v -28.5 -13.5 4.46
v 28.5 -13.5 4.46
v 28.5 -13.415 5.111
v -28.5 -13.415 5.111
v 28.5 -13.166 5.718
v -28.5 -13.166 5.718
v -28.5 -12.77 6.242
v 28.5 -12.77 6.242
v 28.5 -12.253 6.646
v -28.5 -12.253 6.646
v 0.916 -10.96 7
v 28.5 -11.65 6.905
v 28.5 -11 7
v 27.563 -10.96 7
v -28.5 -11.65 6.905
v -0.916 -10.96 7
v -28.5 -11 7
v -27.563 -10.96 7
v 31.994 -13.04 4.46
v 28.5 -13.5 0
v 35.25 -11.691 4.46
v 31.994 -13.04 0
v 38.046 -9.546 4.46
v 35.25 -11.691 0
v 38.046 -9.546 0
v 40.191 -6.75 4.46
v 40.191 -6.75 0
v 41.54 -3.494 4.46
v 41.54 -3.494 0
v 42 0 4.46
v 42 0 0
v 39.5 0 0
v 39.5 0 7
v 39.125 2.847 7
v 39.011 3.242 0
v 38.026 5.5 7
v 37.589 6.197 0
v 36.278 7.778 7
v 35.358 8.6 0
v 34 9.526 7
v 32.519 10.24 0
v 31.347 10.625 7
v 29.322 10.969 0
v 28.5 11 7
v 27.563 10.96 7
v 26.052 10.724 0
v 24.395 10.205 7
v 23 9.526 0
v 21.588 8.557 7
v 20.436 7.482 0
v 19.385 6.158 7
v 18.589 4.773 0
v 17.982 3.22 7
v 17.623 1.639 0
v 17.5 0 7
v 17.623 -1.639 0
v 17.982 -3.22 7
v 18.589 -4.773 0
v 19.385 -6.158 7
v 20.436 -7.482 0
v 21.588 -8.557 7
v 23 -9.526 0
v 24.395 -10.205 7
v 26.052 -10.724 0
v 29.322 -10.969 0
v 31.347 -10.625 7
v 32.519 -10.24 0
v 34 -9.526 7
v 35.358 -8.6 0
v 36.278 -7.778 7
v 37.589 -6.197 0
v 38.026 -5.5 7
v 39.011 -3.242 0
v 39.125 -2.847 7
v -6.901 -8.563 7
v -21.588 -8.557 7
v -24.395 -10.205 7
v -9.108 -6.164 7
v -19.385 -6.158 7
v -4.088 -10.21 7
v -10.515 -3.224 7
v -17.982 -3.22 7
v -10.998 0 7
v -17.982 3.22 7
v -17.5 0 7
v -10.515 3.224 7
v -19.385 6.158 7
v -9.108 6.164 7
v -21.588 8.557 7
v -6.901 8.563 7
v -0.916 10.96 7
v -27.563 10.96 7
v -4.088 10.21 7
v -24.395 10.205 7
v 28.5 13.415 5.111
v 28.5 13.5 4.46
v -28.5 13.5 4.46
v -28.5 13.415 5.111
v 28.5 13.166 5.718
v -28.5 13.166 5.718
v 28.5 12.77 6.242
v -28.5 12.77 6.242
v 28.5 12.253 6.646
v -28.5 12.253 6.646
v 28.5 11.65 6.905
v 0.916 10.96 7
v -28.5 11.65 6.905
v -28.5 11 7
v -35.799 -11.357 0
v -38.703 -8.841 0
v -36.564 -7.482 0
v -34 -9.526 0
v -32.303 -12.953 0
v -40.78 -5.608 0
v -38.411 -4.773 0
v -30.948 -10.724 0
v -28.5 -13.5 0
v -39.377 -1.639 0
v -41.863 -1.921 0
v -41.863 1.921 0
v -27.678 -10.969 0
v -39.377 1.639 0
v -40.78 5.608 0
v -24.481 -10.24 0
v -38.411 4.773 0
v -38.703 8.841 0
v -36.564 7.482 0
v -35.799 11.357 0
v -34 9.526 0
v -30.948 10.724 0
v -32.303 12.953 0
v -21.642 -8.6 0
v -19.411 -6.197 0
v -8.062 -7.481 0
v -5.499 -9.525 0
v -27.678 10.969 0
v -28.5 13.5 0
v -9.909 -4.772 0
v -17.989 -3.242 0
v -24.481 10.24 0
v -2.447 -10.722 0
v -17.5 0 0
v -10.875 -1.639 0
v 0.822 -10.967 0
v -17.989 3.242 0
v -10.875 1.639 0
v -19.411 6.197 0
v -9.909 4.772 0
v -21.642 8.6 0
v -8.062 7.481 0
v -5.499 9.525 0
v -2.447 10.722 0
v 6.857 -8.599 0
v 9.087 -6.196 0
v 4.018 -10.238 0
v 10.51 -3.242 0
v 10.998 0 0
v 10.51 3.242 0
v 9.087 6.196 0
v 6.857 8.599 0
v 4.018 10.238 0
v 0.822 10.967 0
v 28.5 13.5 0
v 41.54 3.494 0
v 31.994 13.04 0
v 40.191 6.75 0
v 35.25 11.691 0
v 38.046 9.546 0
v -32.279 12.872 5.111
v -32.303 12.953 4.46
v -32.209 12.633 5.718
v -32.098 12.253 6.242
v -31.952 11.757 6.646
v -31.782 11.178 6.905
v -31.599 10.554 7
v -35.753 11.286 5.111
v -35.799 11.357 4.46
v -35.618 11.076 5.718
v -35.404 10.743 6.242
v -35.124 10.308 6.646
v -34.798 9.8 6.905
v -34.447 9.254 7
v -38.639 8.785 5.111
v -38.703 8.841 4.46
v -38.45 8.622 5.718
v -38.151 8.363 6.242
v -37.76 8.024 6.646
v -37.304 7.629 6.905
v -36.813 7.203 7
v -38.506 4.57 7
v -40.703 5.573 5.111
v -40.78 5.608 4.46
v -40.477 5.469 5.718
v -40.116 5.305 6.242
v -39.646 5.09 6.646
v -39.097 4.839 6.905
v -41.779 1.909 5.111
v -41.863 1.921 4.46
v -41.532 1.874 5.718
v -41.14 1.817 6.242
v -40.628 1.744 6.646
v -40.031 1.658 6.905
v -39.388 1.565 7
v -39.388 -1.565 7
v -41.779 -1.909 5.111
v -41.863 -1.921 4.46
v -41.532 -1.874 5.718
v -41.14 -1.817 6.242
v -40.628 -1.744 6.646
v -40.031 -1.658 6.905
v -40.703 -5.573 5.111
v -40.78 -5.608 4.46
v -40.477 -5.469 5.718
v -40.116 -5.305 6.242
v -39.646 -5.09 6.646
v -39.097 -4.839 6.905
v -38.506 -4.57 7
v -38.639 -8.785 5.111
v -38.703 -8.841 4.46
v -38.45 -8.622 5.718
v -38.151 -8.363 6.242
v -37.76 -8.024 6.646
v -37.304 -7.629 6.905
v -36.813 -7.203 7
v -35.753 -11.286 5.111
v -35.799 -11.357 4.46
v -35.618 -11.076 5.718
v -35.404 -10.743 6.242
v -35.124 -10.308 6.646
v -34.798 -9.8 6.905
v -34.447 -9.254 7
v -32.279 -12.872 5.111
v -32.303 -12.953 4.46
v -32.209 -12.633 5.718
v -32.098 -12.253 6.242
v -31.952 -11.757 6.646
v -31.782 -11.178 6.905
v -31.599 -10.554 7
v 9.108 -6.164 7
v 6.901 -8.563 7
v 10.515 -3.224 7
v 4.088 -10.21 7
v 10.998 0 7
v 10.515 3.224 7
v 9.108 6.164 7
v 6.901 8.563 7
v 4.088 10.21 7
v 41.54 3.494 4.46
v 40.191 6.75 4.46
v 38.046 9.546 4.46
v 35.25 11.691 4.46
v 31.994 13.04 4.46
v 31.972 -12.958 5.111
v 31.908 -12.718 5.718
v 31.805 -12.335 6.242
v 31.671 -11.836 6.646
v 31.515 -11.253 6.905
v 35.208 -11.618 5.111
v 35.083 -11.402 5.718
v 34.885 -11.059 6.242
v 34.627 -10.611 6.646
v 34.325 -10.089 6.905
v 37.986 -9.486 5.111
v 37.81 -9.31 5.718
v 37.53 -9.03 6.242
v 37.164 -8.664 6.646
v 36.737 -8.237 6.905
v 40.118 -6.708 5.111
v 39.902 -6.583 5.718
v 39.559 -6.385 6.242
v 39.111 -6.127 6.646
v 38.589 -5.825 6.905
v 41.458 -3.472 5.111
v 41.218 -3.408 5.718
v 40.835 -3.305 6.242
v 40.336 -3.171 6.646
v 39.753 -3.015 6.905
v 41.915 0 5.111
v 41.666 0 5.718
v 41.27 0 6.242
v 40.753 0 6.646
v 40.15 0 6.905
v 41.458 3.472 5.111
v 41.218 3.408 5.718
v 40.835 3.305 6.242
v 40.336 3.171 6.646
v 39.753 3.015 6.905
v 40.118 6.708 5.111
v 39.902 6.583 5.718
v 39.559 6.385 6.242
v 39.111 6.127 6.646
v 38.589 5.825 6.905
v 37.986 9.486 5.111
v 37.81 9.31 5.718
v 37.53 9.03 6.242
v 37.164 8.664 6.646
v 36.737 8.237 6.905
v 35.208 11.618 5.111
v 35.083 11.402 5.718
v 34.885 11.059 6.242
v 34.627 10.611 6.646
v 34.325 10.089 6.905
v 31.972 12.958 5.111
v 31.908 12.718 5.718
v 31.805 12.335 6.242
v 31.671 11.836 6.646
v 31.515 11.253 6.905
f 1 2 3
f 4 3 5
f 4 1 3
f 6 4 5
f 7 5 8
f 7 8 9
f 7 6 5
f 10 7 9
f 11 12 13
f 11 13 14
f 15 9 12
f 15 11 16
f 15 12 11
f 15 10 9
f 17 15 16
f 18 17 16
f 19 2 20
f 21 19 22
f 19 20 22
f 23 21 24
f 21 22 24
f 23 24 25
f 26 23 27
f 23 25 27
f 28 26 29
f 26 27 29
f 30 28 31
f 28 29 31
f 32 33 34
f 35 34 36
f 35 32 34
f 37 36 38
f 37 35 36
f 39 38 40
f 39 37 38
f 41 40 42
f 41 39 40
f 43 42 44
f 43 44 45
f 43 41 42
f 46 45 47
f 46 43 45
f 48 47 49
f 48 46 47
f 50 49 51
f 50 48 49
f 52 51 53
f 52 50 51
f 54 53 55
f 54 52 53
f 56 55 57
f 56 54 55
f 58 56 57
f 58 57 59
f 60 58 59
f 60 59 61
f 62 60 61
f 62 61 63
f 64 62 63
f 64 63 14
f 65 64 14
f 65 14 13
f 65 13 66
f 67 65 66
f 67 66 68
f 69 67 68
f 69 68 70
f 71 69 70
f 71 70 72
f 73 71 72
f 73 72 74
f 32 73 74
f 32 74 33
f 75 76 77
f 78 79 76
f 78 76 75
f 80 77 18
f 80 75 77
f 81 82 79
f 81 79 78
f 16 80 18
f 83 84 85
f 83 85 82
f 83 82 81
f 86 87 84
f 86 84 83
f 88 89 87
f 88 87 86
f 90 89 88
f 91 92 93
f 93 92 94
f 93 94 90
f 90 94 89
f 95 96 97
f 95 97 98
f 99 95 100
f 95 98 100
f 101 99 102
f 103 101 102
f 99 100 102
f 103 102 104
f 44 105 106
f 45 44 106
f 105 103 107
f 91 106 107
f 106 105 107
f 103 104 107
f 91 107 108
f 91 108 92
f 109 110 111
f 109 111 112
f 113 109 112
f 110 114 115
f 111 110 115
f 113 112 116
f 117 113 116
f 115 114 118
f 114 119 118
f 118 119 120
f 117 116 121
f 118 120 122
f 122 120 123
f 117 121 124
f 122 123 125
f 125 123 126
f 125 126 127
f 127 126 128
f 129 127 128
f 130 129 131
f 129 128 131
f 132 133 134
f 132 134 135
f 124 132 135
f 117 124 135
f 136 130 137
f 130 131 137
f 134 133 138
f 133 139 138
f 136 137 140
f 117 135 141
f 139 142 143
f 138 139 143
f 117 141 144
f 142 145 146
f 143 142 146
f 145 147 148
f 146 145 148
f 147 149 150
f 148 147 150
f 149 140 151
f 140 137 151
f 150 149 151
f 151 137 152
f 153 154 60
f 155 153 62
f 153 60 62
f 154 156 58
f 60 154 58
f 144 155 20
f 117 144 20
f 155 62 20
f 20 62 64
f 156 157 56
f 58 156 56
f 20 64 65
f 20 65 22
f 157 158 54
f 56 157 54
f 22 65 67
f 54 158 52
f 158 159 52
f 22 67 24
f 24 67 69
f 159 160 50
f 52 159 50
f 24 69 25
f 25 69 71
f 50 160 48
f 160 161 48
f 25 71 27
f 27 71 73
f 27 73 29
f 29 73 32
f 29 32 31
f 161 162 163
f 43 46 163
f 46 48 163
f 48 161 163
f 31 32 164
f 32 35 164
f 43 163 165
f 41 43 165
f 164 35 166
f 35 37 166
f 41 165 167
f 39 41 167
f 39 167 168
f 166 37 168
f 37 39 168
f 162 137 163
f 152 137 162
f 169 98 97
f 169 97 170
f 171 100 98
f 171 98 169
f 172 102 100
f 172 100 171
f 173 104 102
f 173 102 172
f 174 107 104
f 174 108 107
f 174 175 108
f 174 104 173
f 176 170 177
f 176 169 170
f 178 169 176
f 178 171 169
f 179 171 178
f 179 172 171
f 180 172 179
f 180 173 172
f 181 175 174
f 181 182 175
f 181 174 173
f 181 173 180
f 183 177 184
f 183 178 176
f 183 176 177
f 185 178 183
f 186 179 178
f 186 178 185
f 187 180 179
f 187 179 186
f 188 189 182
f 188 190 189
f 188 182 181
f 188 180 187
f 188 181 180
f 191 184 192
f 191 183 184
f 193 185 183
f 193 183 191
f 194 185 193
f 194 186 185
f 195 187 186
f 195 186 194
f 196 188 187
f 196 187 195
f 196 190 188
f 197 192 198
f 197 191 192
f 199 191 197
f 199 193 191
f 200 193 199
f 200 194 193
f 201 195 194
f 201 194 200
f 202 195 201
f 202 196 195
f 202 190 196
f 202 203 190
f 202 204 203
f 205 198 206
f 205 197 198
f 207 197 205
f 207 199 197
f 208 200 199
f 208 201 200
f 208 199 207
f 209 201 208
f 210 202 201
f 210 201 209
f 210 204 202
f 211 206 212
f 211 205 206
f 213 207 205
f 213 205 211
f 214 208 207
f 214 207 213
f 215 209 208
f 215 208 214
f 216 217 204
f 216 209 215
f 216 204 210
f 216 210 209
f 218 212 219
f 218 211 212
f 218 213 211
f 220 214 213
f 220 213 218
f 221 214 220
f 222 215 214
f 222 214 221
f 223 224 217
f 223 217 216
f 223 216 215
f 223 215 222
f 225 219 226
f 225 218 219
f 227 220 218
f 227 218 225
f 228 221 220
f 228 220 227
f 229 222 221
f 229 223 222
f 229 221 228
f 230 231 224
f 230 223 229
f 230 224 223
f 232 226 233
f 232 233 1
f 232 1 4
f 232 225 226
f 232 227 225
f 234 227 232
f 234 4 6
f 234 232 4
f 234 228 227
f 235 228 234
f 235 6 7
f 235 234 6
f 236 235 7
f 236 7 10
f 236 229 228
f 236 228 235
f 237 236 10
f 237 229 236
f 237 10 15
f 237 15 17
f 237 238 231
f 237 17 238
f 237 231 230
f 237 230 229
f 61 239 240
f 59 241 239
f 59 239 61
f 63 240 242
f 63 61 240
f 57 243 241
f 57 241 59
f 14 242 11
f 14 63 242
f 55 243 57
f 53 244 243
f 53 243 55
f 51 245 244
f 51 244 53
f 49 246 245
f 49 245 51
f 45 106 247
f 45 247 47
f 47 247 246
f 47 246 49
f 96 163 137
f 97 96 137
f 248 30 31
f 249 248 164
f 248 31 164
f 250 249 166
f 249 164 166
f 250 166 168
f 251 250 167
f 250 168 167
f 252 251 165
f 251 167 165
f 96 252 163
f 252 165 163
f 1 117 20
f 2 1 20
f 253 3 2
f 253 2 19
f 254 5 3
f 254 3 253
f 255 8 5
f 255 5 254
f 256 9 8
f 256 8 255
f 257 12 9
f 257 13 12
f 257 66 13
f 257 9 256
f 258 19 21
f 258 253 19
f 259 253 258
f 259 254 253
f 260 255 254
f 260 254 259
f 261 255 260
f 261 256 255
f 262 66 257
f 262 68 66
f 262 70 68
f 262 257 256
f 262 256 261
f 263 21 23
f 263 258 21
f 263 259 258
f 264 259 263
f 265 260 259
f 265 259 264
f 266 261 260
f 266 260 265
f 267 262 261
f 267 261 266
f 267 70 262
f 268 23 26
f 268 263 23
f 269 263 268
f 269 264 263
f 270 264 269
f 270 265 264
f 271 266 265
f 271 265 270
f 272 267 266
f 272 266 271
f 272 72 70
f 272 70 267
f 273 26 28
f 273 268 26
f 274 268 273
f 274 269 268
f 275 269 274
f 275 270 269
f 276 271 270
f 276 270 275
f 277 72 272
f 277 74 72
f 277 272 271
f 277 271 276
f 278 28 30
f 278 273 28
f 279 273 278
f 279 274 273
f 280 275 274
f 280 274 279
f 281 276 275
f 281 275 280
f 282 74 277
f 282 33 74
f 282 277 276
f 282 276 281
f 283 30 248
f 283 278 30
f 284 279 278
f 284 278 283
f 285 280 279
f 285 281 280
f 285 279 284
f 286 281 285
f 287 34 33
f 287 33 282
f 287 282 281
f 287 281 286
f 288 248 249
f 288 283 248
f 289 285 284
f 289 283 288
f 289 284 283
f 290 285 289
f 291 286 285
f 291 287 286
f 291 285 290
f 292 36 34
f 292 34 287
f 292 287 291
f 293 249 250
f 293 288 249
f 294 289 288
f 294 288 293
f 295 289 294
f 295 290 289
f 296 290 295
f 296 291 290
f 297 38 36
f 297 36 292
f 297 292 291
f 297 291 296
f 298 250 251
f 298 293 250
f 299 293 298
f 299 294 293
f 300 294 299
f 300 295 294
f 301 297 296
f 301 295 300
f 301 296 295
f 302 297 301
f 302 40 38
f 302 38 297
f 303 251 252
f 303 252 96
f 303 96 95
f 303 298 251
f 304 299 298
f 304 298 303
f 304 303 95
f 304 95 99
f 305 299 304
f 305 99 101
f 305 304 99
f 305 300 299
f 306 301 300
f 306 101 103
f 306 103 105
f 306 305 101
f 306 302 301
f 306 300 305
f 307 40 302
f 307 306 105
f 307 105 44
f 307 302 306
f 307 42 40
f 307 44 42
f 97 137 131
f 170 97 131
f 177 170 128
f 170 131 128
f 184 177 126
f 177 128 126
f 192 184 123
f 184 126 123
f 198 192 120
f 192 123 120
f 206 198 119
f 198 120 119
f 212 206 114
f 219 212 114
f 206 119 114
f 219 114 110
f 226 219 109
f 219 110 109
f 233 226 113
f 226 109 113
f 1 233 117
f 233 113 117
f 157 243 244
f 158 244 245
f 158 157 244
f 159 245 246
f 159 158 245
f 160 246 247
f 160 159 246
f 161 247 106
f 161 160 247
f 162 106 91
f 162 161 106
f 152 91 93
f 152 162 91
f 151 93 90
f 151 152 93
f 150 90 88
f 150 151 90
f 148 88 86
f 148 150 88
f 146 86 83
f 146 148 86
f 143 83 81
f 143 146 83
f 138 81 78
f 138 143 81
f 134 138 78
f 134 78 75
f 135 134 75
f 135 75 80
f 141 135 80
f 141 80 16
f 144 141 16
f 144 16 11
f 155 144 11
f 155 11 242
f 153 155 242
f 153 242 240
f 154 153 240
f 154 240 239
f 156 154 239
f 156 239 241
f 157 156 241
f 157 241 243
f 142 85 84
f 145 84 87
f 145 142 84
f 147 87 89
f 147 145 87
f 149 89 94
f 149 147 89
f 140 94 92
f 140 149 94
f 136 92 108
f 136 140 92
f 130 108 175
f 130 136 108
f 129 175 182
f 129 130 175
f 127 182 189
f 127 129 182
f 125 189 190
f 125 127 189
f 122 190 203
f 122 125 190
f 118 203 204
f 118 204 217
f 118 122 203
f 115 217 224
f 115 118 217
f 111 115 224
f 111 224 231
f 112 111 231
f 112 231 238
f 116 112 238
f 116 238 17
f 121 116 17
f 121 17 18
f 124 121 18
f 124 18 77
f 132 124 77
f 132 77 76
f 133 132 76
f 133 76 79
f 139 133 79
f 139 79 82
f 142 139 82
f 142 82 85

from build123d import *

# Parameters (mm, degrees)
F0_R        = 10.9982
F0_R_2      = 11
F1_DEPTH    = 7
F2_T1_DEPTH = 57
F2_T4_ANGLE = 180
F2_T6_ANGLE = 180


# Not quite as in the source:
# - a fillet or chamfer that OpenCascade refuses, or shapes differently, is made with other operations: its cross-section is extruded or revolved along the edge and cut away or added


with BuildPart() as f1:
    # F0 (on Top) → F1 (new body)
    with BuildSketch(Plane.XY):
        with BuildLine():
            ThreePointArc((-28.5, 13.5), (-18.954058454, 9.545941546), (-15, 0))
            ThreePointArc((-15, 0), (-18.954058454, -9.545941546), (-28.5, -13.5))
            Line((-28.5, -13.5), (28.5, -13.5))
            ThreePointArc((28.5, -13.5), (15, 0), (28.5, 13.5))
            Line((28.5, 13.5), (-28.5, 13.5))
        make_face()
        Circle(F0_R, mode=Mode.SUBTRACT)
        with BuildLine():
            ThreePointArc((-28.5, -13.5), (-18.954058454, -9.545941546), (-15, 0))
            ThreePointArc((-15, 0), (-18.954058454, 9.545941546), (-28.5, 13.5))
            ThreePointArc((-28.5, 13.5), (-42, 0), (-28.5, -13.5))
        make_face()
        with Locations((-28.5, 0)):
            Circle(F0_R_2, mode=Mode.SUBTRACT)
        with BuildLine():
            ThreePointArc((42, 0), (38.045941546, 9.545941546), (28.5, 13.5))
            ThreePointArc((28.5, 13.5), (15, 0), (28.5, -13.5))
            ThreePointArc((28.5, -13.5), (38.045941546, -9.545941546), (42, 0))
        make_face()
        with Locations((28.5, 0)):
            Circle(F0_R_2, mode=Mode.SUBTRACT)
    extrude(amount=F1_DEPTH)

    # F2: fillet of radius 2.54 on 4 edges, made by hand

    # F2_s2 → F2_t1 (cut)
    with BuildSketch(Plane.YZ.offset(-28.5)):
        with BuildLine():
            ThreePointArc((13.5, 4.46), (12.7560512242, 6.2560512242), (10.96, 7))
            Line((10.96, 7), (13.5, 7))
            Line((13.5, 7), (13.5, 4.46))
        make_face()
        with BuildLine():
            ThreePointArc((-13.5, 4.46), (-12.7560512242, 6.2560512242), (-10.96, 7))
            Line((-10.96, 7), (-13.5, 7))
            Line((-13.5, 7), (-13.5, 4.46))
        make_face()
    extrude(amount=F2_T1_DEPTH, mode=Mode.SUBTRACT)

    # F2_s3 → F2_t4 (revolve, cut)
    with BuildSketch(Plane.YZ.offset(-28.5)):
        with BuildLine():
            ThreePointArc((13.5, 4.46), (12.7560512242, 6.2560512242), (10.96, 7))
            Line((10.96, 7), (13.5, 7))
            Line((13.5, 7), (13.5, 4.46))
        make_face()
    revolve(axis=Axis((-28.5, 0, 7), (0, 0, 1)), revolution_arc=F2_T4_ANGLE, mode=Mode.SUBTRACT)

    # F2_s5 → F2_t6 (revolve, cut)
    with BuildSketch(Plane.YZ.offset(28.5)):
        with BuildLine():
            ThreePointArc((-13.5, 4.46), (-12.7560512242, 6.2560512242), (-10.96, 7))
            Line((-10.96, 7), (-13.5, 7))
            Line((-13.5, 7), (-13.5, 4.46))
        make_face()
    revolve(axis=Axis((28.5, 0, 7), (0, 0, 1)), revolution_arc=F2_T6_ANGLE, mode=Mode.SUBTRACT)


solid = f1.part
